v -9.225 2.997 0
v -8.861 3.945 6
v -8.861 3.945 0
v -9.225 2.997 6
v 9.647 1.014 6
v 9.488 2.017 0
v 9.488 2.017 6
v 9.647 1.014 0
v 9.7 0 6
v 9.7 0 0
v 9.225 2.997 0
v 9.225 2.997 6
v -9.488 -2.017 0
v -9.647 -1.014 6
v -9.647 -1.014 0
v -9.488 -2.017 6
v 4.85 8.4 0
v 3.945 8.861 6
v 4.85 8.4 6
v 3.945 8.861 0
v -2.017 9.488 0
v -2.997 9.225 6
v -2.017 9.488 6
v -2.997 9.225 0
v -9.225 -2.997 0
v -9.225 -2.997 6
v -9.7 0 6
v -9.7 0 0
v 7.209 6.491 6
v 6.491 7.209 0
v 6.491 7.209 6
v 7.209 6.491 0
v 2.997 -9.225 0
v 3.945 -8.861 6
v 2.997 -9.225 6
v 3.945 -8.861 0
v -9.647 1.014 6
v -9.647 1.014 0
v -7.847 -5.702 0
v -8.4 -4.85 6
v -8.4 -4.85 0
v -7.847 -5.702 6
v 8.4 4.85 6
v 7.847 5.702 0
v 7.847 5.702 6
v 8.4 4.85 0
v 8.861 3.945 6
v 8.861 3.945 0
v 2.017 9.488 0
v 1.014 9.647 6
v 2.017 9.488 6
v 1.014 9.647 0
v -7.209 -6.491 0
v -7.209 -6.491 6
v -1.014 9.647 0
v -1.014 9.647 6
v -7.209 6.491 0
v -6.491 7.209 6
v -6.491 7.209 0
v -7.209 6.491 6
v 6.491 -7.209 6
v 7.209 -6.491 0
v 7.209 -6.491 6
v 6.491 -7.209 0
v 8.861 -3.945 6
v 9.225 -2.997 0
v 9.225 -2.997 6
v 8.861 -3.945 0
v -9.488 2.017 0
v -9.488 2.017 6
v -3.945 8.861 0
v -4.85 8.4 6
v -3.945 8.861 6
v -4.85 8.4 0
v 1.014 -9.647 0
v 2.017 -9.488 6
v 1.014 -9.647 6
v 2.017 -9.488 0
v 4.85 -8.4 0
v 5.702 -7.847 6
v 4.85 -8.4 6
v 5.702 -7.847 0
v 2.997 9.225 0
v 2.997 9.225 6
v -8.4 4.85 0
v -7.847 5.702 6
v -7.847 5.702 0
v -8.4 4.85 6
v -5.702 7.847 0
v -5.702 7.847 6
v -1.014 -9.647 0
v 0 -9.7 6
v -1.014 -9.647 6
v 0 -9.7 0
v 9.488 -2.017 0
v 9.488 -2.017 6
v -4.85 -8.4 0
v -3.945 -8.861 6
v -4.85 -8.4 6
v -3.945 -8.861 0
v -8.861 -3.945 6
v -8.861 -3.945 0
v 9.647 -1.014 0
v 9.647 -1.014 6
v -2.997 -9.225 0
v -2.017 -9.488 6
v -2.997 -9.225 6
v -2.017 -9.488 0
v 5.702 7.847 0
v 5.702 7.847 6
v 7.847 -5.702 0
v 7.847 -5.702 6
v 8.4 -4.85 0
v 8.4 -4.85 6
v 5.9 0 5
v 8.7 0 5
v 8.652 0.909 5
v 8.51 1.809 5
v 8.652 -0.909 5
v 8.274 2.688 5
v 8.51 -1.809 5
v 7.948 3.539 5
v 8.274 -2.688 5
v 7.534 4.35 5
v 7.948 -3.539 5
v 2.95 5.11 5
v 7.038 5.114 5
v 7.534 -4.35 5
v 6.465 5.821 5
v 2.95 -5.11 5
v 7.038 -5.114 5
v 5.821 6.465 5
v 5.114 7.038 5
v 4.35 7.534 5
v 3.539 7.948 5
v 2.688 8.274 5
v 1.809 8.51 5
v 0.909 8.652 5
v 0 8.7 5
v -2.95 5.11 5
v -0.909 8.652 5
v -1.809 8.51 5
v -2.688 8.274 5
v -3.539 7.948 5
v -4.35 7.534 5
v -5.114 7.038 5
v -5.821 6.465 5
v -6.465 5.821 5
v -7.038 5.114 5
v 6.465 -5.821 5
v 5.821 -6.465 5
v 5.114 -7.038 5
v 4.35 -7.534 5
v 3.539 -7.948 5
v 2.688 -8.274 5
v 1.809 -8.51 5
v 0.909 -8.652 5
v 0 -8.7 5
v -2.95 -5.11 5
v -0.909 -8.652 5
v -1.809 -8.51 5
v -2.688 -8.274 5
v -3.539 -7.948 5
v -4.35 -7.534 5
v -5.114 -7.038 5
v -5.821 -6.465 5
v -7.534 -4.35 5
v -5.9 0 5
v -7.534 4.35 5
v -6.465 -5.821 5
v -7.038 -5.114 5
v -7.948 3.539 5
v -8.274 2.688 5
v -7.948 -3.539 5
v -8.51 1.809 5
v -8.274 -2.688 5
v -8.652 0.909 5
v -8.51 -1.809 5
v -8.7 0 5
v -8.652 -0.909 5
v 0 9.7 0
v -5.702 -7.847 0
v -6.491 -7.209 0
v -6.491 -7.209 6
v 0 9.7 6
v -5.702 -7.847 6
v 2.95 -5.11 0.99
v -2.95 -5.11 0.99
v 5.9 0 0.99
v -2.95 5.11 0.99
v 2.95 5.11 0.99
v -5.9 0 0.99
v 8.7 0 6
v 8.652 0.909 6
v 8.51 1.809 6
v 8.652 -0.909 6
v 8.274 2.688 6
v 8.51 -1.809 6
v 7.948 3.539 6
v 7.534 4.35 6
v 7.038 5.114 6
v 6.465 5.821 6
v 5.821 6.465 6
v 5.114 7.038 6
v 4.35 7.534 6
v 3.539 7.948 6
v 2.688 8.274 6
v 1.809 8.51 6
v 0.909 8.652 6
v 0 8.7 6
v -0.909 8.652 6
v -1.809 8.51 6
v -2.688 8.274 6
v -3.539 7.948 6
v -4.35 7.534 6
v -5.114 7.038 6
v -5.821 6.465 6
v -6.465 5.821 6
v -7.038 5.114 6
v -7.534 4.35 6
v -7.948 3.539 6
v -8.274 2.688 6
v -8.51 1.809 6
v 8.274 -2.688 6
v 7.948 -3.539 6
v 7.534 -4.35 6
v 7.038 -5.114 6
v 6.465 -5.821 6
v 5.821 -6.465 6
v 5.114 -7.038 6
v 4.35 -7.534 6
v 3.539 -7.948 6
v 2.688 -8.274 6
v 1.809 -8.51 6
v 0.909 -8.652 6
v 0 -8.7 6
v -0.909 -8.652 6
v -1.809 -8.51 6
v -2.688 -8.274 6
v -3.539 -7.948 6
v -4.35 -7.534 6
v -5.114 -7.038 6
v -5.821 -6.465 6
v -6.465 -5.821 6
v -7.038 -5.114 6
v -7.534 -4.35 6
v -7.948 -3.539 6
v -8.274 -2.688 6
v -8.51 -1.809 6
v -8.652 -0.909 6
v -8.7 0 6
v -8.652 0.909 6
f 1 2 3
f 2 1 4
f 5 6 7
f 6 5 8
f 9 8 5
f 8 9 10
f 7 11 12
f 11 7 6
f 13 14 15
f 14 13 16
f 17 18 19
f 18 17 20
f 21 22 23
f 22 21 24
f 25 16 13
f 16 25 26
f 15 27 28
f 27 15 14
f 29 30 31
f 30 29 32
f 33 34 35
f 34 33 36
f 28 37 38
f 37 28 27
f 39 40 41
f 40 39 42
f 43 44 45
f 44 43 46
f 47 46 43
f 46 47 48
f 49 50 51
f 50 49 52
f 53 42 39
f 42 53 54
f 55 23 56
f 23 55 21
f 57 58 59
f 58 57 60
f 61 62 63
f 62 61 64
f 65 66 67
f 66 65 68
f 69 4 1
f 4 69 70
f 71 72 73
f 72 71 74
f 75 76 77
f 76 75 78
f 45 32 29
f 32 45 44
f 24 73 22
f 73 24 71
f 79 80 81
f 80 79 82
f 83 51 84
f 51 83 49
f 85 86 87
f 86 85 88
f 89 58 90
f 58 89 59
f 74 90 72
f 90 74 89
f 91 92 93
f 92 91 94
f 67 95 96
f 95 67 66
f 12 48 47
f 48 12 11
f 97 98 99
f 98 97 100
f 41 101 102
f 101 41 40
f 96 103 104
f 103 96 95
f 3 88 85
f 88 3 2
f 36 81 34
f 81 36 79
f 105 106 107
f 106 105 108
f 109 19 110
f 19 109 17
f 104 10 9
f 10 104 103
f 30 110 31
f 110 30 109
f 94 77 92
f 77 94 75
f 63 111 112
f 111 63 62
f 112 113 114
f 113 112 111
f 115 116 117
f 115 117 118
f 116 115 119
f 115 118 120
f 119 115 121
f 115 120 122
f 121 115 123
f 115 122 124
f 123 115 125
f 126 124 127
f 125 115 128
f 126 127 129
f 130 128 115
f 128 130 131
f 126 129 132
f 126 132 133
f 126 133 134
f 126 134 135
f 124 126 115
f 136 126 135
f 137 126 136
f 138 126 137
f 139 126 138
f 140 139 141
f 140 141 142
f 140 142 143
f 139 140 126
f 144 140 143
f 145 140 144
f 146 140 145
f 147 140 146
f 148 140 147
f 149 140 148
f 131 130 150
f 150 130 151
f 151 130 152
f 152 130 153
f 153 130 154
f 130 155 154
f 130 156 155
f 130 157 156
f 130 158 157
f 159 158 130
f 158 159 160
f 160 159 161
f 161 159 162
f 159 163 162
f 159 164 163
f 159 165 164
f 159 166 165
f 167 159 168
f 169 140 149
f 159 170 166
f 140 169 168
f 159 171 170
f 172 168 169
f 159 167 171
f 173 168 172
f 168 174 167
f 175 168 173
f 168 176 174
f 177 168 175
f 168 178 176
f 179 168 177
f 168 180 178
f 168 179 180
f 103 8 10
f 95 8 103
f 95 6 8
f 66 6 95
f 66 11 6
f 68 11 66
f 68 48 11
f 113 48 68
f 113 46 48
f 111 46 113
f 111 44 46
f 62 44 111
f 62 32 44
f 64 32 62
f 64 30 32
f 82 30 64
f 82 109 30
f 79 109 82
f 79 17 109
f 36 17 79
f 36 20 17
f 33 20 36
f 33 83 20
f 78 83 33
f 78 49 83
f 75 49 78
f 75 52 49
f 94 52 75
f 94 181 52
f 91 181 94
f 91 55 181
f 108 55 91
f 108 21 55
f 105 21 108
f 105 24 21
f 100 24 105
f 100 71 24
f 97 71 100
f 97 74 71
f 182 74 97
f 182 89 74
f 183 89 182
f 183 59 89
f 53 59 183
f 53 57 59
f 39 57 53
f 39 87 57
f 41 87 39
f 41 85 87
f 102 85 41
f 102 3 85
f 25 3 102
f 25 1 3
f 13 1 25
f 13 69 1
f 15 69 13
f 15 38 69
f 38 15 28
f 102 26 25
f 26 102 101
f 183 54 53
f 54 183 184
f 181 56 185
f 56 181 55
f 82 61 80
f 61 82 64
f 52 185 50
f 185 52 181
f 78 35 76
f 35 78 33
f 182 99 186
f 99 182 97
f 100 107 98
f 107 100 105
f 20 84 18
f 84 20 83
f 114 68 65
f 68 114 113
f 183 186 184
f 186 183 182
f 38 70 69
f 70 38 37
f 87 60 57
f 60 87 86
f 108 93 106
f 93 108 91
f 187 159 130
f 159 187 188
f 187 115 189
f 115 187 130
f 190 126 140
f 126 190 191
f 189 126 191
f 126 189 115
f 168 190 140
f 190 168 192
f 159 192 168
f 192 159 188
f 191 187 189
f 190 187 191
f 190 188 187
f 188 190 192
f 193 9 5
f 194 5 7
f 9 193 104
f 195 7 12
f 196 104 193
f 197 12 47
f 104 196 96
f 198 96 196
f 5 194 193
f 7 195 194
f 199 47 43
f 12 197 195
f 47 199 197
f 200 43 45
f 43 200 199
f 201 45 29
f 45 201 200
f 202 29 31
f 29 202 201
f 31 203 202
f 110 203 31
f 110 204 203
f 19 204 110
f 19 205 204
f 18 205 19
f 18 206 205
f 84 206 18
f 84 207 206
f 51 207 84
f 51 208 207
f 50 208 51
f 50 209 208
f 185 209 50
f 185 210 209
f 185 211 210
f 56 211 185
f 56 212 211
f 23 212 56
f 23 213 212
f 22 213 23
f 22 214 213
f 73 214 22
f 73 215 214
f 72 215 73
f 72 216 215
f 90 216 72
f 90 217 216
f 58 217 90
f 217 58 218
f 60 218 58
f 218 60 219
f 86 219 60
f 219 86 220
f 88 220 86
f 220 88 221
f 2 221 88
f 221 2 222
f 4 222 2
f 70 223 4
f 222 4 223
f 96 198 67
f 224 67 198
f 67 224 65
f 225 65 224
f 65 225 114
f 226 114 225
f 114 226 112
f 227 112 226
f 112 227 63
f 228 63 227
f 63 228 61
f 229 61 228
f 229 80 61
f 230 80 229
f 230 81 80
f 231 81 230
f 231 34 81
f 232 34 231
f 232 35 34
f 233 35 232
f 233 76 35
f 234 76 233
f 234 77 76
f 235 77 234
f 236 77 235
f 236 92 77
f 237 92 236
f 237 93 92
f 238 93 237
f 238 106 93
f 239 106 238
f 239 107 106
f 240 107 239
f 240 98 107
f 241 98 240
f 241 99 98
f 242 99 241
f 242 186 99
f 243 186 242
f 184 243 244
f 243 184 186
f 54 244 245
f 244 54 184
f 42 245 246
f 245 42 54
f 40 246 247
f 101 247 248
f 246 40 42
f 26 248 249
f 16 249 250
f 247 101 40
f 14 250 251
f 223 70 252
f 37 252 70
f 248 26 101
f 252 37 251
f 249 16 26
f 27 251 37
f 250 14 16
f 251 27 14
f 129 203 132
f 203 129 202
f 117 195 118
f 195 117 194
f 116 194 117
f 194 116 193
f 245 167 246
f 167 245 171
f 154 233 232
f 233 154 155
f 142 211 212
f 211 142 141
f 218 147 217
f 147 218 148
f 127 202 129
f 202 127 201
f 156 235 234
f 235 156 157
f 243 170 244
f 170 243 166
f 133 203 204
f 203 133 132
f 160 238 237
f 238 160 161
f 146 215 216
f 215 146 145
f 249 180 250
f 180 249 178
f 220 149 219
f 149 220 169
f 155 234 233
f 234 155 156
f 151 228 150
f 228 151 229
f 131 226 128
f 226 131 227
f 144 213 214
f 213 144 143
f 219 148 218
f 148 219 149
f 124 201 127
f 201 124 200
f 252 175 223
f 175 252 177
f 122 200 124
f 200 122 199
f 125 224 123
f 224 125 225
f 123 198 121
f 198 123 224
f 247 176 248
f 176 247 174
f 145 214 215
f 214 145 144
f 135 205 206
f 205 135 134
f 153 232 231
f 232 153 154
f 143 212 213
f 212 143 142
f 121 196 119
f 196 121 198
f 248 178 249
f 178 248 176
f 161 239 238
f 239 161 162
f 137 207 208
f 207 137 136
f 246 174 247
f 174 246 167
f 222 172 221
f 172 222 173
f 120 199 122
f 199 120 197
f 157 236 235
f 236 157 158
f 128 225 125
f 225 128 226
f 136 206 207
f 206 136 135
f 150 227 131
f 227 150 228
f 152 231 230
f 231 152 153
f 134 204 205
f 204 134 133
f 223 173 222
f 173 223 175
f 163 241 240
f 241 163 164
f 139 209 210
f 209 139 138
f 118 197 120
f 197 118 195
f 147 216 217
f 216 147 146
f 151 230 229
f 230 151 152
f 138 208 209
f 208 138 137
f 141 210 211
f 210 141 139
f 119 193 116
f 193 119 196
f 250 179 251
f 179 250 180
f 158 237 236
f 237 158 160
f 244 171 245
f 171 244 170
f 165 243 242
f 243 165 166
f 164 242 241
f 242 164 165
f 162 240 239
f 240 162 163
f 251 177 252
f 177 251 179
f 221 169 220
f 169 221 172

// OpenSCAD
$fn=60;
DELTA=0.01;
H=4;

DIN=17.4;
INNER=11.8;
D=DIN+2;

if(1)difference()
{
	cylinder(d=D,h=H+1);
	translate([0,0,1-DELTA]) cylinder(d=INNER,h=H+1+2*DELTA,$fn=6);
}

translate([0,0,2]) difference()
{
	cylinder(d=DIN+2,h=H);
	translate([0,0,-DELTA])cylinder(d=DIN,h=H+2*DELTA);
}
